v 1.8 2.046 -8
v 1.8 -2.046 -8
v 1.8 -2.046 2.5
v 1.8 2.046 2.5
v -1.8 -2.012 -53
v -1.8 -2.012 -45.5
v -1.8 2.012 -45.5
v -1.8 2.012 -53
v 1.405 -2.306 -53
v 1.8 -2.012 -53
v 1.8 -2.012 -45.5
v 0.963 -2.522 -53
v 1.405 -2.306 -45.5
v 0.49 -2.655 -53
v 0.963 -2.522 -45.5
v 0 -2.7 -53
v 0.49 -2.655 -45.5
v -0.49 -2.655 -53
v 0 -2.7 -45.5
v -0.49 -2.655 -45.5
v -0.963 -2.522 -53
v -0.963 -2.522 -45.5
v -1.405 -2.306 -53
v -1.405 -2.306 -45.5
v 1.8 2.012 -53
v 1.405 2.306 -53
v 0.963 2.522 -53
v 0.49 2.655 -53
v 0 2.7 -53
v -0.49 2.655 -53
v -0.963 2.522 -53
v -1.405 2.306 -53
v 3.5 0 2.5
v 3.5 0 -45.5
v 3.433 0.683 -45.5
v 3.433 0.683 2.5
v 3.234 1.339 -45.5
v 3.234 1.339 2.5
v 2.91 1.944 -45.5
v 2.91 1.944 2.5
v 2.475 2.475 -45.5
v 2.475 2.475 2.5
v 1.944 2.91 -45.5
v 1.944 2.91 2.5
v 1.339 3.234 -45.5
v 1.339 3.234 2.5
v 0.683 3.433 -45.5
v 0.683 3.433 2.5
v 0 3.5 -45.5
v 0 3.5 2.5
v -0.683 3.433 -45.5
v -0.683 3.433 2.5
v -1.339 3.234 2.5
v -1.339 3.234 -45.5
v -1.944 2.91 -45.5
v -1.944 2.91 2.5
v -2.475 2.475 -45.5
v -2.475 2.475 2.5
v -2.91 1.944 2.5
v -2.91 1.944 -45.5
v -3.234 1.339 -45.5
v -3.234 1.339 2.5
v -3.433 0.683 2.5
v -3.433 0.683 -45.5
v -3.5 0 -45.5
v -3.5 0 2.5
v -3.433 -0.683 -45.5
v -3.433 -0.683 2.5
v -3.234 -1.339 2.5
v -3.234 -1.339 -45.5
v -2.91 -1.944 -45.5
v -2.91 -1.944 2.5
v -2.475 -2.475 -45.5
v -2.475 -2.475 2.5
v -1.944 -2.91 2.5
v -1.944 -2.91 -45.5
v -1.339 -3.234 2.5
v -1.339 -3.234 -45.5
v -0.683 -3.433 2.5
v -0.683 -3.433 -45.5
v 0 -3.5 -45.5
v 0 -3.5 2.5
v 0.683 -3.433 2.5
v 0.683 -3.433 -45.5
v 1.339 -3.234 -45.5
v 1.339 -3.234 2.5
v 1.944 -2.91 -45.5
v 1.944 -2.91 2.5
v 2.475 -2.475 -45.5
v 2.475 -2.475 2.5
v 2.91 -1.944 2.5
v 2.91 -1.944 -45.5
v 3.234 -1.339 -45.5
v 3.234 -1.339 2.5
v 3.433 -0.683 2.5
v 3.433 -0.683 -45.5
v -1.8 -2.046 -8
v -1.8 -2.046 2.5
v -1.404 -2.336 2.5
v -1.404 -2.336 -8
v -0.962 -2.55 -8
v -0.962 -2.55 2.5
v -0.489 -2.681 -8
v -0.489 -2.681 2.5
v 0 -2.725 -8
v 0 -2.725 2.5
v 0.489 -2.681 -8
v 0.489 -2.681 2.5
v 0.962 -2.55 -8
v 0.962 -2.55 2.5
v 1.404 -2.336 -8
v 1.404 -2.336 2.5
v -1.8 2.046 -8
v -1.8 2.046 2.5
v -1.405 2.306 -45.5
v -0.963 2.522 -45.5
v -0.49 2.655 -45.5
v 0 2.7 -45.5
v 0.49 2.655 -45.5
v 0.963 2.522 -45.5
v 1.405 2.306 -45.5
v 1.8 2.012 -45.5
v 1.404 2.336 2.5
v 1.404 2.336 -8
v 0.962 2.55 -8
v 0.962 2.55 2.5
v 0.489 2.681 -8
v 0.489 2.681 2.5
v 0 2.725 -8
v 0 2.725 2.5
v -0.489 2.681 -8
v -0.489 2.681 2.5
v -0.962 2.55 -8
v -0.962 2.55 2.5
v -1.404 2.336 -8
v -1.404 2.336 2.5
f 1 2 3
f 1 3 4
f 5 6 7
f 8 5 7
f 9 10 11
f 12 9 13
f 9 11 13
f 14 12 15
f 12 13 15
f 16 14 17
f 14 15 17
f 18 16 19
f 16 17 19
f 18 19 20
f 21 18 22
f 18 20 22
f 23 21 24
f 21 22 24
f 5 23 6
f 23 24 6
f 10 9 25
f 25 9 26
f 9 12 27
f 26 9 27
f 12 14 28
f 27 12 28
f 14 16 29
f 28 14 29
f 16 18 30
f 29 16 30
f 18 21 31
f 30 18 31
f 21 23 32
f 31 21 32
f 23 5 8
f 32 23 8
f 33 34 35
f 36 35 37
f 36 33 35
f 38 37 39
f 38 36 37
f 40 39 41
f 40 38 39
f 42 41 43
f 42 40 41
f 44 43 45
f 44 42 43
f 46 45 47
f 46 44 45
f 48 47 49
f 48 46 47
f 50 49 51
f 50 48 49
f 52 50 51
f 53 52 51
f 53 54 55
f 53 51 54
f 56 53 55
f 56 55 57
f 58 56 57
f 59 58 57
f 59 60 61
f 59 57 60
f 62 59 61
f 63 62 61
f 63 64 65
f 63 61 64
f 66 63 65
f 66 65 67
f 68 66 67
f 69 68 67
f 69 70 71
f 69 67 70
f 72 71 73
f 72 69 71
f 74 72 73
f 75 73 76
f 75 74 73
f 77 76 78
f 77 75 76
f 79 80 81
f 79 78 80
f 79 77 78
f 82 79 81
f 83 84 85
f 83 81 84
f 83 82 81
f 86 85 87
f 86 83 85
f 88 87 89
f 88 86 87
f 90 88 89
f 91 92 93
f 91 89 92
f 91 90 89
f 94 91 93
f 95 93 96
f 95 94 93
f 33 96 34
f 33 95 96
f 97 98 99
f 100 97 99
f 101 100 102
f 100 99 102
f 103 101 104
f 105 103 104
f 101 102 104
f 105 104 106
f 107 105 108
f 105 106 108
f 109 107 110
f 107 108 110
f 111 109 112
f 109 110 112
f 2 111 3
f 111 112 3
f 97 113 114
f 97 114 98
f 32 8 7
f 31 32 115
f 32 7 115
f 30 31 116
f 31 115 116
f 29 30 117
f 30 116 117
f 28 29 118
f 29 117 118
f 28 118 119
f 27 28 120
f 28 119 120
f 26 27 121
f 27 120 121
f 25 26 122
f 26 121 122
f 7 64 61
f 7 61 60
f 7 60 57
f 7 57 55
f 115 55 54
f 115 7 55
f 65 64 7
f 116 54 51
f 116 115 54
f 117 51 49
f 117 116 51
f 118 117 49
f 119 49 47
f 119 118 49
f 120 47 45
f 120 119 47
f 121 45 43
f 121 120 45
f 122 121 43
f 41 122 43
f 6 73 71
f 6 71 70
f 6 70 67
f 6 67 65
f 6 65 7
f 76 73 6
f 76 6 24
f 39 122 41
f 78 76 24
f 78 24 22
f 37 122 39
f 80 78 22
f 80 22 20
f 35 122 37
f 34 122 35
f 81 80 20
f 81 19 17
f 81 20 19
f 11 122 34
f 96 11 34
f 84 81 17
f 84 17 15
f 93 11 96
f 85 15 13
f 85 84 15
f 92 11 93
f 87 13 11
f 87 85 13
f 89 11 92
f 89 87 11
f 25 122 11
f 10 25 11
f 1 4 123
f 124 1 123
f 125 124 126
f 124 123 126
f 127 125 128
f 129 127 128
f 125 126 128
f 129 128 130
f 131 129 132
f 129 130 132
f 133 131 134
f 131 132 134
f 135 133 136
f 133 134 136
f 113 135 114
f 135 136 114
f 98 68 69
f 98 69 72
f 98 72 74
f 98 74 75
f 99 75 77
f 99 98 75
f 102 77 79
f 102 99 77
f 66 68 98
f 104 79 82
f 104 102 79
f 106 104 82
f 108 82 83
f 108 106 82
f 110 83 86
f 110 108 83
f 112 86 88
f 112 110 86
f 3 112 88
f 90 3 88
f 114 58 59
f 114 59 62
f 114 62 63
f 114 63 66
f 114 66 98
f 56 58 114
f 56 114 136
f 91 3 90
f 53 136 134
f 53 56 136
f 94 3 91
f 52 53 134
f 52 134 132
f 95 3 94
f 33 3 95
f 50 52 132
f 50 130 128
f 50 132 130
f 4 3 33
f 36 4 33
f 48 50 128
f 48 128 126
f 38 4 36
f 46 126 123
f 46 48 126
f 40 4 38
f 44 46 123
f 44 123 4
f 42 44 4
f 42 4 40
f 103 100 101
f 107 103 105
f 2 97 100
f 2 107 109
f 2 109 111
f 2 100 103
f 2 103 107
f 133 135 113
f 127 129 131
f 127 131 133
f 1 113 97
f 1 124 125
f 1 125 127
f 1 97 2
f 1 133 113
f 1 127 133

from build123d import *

# Parameters (mm, degrees)
CROQUIS1_R              = 3.5
SALIENTE_EXTRUIR1_DEPTH = 65.5
CORTAR_EXTRUIR3_DEPTH   = 8
CORTAR_EXTRUIR5_START   = -20
CROQUIS7_R              = 3.5
CORTAR_EXTRUIR5_DEPTH   = 20
CROQUIS8_W              = 12.617225576
CROQUIS8_H              = 9.28288649
CORTAR_EXTRUIR6_DEPTH   = 10
SALIENTE_EXTRUIR2_START = 2.5
CROQUIS10_R             = 3.5
SALIENTE_EXTRUIR2_DEPTH = 2.5


with BuildPart() as part:
    # Croquis1 → Saliente-Extruir1 (new body)
    with BuildSketch(Plane.XY):
        Circle(CROQUIS1_R)
    extrude(amount=-SALIENTE_EXTRUIR1_DEPTH)

    # Croquis6 → Cortar-Extruir3 (cut)
    with BuildSketch(Plane.XY):
        with BuildLine():
            Line((-1.8, 2.045880006), (-1.8, -2.045880006))
            ThreePointArc((-1.8, -2.045880006), (0, -2.725), (1.8, -2.045880006))
            Line((1.8, -2.045880006), (1.8, 2.045880006))
            ThreePointArc((1.8, 2.045880006), (0, 2.725), (-1.8, 2.045880006))
        make_face()
    extrude(amount=-CORTAR_EXTRUIR3_DEPTH, mode=Mode.SUBTRACT)

    # Croquis7 → Cortar-Extruir5 (cut)
    with BuildSketch(Plane(origin=(0, 0, -65.5), x_dir=(-1, 0, 0), z_dir=(0, 0, -1)).offset(CORTAR_EXTRUIR5_START)):
        with Locations(Location((0, 0, 0), (0, 0, 180))):
            Circle(CROQUIS7_R)
        with BuildLine():
            ThreePointArc((1.8, 2.01246118), (0, 2.7), (-1.8, 2.01246118))
            Line((-1.8, 2.01246118), (-1.8, -2.01246118))
            ThreePointArc((-1.8, -2.01246118), (0, -2.7), (1.8, -2.01246118))
            Line((1.8, -2.01246118), (1.8, 2.01246118))
        make_face(mode=Mode.SUBTRACT)
    extrude(amount=CORTAR_EXTRUIR5_DEPTH, mode=Mode.SUBTRACT)

    # Croquis8 → Cortar-Extruir6 (cut)
    with BuildSketch(Plane.ZY.offset(1.8)):
        with Locations((-59.308612788, -0.436721269)):
            Rectangle(CROQUIS8_W, CROQUIS8_H)
    extrude(amount=-CORTAR_EXTRUIR6_DEPTH, mode=Mode.SUBTRACT)

    # Croquis10 → Saliente-Extruir2 (add)
    with BuildSketch(Plane.XY.offset(SALIENTE_EXTRUIR2_START)):
        Circle(CROQUIS10_R)
        with BuildLine():
            Line((-1.8, 2.045880006), (-1.8, -2.045880006))
            ThreePointArc((-1.8, -2.045880006), (0, -2.725), (1.8, -2.045880006))
            Line((1.8, -2.045880006), (1.8, 2.045880006))
            ThreePointArc((1.8, 2.045880006), (0, 2.725), (-1.8, 2.045880006))
        make_face(mode=Mode.SUBTRACT)
    extrude(amount=-SALIENTE_EXTRUIR2_DEPTH)


solid = part.part
